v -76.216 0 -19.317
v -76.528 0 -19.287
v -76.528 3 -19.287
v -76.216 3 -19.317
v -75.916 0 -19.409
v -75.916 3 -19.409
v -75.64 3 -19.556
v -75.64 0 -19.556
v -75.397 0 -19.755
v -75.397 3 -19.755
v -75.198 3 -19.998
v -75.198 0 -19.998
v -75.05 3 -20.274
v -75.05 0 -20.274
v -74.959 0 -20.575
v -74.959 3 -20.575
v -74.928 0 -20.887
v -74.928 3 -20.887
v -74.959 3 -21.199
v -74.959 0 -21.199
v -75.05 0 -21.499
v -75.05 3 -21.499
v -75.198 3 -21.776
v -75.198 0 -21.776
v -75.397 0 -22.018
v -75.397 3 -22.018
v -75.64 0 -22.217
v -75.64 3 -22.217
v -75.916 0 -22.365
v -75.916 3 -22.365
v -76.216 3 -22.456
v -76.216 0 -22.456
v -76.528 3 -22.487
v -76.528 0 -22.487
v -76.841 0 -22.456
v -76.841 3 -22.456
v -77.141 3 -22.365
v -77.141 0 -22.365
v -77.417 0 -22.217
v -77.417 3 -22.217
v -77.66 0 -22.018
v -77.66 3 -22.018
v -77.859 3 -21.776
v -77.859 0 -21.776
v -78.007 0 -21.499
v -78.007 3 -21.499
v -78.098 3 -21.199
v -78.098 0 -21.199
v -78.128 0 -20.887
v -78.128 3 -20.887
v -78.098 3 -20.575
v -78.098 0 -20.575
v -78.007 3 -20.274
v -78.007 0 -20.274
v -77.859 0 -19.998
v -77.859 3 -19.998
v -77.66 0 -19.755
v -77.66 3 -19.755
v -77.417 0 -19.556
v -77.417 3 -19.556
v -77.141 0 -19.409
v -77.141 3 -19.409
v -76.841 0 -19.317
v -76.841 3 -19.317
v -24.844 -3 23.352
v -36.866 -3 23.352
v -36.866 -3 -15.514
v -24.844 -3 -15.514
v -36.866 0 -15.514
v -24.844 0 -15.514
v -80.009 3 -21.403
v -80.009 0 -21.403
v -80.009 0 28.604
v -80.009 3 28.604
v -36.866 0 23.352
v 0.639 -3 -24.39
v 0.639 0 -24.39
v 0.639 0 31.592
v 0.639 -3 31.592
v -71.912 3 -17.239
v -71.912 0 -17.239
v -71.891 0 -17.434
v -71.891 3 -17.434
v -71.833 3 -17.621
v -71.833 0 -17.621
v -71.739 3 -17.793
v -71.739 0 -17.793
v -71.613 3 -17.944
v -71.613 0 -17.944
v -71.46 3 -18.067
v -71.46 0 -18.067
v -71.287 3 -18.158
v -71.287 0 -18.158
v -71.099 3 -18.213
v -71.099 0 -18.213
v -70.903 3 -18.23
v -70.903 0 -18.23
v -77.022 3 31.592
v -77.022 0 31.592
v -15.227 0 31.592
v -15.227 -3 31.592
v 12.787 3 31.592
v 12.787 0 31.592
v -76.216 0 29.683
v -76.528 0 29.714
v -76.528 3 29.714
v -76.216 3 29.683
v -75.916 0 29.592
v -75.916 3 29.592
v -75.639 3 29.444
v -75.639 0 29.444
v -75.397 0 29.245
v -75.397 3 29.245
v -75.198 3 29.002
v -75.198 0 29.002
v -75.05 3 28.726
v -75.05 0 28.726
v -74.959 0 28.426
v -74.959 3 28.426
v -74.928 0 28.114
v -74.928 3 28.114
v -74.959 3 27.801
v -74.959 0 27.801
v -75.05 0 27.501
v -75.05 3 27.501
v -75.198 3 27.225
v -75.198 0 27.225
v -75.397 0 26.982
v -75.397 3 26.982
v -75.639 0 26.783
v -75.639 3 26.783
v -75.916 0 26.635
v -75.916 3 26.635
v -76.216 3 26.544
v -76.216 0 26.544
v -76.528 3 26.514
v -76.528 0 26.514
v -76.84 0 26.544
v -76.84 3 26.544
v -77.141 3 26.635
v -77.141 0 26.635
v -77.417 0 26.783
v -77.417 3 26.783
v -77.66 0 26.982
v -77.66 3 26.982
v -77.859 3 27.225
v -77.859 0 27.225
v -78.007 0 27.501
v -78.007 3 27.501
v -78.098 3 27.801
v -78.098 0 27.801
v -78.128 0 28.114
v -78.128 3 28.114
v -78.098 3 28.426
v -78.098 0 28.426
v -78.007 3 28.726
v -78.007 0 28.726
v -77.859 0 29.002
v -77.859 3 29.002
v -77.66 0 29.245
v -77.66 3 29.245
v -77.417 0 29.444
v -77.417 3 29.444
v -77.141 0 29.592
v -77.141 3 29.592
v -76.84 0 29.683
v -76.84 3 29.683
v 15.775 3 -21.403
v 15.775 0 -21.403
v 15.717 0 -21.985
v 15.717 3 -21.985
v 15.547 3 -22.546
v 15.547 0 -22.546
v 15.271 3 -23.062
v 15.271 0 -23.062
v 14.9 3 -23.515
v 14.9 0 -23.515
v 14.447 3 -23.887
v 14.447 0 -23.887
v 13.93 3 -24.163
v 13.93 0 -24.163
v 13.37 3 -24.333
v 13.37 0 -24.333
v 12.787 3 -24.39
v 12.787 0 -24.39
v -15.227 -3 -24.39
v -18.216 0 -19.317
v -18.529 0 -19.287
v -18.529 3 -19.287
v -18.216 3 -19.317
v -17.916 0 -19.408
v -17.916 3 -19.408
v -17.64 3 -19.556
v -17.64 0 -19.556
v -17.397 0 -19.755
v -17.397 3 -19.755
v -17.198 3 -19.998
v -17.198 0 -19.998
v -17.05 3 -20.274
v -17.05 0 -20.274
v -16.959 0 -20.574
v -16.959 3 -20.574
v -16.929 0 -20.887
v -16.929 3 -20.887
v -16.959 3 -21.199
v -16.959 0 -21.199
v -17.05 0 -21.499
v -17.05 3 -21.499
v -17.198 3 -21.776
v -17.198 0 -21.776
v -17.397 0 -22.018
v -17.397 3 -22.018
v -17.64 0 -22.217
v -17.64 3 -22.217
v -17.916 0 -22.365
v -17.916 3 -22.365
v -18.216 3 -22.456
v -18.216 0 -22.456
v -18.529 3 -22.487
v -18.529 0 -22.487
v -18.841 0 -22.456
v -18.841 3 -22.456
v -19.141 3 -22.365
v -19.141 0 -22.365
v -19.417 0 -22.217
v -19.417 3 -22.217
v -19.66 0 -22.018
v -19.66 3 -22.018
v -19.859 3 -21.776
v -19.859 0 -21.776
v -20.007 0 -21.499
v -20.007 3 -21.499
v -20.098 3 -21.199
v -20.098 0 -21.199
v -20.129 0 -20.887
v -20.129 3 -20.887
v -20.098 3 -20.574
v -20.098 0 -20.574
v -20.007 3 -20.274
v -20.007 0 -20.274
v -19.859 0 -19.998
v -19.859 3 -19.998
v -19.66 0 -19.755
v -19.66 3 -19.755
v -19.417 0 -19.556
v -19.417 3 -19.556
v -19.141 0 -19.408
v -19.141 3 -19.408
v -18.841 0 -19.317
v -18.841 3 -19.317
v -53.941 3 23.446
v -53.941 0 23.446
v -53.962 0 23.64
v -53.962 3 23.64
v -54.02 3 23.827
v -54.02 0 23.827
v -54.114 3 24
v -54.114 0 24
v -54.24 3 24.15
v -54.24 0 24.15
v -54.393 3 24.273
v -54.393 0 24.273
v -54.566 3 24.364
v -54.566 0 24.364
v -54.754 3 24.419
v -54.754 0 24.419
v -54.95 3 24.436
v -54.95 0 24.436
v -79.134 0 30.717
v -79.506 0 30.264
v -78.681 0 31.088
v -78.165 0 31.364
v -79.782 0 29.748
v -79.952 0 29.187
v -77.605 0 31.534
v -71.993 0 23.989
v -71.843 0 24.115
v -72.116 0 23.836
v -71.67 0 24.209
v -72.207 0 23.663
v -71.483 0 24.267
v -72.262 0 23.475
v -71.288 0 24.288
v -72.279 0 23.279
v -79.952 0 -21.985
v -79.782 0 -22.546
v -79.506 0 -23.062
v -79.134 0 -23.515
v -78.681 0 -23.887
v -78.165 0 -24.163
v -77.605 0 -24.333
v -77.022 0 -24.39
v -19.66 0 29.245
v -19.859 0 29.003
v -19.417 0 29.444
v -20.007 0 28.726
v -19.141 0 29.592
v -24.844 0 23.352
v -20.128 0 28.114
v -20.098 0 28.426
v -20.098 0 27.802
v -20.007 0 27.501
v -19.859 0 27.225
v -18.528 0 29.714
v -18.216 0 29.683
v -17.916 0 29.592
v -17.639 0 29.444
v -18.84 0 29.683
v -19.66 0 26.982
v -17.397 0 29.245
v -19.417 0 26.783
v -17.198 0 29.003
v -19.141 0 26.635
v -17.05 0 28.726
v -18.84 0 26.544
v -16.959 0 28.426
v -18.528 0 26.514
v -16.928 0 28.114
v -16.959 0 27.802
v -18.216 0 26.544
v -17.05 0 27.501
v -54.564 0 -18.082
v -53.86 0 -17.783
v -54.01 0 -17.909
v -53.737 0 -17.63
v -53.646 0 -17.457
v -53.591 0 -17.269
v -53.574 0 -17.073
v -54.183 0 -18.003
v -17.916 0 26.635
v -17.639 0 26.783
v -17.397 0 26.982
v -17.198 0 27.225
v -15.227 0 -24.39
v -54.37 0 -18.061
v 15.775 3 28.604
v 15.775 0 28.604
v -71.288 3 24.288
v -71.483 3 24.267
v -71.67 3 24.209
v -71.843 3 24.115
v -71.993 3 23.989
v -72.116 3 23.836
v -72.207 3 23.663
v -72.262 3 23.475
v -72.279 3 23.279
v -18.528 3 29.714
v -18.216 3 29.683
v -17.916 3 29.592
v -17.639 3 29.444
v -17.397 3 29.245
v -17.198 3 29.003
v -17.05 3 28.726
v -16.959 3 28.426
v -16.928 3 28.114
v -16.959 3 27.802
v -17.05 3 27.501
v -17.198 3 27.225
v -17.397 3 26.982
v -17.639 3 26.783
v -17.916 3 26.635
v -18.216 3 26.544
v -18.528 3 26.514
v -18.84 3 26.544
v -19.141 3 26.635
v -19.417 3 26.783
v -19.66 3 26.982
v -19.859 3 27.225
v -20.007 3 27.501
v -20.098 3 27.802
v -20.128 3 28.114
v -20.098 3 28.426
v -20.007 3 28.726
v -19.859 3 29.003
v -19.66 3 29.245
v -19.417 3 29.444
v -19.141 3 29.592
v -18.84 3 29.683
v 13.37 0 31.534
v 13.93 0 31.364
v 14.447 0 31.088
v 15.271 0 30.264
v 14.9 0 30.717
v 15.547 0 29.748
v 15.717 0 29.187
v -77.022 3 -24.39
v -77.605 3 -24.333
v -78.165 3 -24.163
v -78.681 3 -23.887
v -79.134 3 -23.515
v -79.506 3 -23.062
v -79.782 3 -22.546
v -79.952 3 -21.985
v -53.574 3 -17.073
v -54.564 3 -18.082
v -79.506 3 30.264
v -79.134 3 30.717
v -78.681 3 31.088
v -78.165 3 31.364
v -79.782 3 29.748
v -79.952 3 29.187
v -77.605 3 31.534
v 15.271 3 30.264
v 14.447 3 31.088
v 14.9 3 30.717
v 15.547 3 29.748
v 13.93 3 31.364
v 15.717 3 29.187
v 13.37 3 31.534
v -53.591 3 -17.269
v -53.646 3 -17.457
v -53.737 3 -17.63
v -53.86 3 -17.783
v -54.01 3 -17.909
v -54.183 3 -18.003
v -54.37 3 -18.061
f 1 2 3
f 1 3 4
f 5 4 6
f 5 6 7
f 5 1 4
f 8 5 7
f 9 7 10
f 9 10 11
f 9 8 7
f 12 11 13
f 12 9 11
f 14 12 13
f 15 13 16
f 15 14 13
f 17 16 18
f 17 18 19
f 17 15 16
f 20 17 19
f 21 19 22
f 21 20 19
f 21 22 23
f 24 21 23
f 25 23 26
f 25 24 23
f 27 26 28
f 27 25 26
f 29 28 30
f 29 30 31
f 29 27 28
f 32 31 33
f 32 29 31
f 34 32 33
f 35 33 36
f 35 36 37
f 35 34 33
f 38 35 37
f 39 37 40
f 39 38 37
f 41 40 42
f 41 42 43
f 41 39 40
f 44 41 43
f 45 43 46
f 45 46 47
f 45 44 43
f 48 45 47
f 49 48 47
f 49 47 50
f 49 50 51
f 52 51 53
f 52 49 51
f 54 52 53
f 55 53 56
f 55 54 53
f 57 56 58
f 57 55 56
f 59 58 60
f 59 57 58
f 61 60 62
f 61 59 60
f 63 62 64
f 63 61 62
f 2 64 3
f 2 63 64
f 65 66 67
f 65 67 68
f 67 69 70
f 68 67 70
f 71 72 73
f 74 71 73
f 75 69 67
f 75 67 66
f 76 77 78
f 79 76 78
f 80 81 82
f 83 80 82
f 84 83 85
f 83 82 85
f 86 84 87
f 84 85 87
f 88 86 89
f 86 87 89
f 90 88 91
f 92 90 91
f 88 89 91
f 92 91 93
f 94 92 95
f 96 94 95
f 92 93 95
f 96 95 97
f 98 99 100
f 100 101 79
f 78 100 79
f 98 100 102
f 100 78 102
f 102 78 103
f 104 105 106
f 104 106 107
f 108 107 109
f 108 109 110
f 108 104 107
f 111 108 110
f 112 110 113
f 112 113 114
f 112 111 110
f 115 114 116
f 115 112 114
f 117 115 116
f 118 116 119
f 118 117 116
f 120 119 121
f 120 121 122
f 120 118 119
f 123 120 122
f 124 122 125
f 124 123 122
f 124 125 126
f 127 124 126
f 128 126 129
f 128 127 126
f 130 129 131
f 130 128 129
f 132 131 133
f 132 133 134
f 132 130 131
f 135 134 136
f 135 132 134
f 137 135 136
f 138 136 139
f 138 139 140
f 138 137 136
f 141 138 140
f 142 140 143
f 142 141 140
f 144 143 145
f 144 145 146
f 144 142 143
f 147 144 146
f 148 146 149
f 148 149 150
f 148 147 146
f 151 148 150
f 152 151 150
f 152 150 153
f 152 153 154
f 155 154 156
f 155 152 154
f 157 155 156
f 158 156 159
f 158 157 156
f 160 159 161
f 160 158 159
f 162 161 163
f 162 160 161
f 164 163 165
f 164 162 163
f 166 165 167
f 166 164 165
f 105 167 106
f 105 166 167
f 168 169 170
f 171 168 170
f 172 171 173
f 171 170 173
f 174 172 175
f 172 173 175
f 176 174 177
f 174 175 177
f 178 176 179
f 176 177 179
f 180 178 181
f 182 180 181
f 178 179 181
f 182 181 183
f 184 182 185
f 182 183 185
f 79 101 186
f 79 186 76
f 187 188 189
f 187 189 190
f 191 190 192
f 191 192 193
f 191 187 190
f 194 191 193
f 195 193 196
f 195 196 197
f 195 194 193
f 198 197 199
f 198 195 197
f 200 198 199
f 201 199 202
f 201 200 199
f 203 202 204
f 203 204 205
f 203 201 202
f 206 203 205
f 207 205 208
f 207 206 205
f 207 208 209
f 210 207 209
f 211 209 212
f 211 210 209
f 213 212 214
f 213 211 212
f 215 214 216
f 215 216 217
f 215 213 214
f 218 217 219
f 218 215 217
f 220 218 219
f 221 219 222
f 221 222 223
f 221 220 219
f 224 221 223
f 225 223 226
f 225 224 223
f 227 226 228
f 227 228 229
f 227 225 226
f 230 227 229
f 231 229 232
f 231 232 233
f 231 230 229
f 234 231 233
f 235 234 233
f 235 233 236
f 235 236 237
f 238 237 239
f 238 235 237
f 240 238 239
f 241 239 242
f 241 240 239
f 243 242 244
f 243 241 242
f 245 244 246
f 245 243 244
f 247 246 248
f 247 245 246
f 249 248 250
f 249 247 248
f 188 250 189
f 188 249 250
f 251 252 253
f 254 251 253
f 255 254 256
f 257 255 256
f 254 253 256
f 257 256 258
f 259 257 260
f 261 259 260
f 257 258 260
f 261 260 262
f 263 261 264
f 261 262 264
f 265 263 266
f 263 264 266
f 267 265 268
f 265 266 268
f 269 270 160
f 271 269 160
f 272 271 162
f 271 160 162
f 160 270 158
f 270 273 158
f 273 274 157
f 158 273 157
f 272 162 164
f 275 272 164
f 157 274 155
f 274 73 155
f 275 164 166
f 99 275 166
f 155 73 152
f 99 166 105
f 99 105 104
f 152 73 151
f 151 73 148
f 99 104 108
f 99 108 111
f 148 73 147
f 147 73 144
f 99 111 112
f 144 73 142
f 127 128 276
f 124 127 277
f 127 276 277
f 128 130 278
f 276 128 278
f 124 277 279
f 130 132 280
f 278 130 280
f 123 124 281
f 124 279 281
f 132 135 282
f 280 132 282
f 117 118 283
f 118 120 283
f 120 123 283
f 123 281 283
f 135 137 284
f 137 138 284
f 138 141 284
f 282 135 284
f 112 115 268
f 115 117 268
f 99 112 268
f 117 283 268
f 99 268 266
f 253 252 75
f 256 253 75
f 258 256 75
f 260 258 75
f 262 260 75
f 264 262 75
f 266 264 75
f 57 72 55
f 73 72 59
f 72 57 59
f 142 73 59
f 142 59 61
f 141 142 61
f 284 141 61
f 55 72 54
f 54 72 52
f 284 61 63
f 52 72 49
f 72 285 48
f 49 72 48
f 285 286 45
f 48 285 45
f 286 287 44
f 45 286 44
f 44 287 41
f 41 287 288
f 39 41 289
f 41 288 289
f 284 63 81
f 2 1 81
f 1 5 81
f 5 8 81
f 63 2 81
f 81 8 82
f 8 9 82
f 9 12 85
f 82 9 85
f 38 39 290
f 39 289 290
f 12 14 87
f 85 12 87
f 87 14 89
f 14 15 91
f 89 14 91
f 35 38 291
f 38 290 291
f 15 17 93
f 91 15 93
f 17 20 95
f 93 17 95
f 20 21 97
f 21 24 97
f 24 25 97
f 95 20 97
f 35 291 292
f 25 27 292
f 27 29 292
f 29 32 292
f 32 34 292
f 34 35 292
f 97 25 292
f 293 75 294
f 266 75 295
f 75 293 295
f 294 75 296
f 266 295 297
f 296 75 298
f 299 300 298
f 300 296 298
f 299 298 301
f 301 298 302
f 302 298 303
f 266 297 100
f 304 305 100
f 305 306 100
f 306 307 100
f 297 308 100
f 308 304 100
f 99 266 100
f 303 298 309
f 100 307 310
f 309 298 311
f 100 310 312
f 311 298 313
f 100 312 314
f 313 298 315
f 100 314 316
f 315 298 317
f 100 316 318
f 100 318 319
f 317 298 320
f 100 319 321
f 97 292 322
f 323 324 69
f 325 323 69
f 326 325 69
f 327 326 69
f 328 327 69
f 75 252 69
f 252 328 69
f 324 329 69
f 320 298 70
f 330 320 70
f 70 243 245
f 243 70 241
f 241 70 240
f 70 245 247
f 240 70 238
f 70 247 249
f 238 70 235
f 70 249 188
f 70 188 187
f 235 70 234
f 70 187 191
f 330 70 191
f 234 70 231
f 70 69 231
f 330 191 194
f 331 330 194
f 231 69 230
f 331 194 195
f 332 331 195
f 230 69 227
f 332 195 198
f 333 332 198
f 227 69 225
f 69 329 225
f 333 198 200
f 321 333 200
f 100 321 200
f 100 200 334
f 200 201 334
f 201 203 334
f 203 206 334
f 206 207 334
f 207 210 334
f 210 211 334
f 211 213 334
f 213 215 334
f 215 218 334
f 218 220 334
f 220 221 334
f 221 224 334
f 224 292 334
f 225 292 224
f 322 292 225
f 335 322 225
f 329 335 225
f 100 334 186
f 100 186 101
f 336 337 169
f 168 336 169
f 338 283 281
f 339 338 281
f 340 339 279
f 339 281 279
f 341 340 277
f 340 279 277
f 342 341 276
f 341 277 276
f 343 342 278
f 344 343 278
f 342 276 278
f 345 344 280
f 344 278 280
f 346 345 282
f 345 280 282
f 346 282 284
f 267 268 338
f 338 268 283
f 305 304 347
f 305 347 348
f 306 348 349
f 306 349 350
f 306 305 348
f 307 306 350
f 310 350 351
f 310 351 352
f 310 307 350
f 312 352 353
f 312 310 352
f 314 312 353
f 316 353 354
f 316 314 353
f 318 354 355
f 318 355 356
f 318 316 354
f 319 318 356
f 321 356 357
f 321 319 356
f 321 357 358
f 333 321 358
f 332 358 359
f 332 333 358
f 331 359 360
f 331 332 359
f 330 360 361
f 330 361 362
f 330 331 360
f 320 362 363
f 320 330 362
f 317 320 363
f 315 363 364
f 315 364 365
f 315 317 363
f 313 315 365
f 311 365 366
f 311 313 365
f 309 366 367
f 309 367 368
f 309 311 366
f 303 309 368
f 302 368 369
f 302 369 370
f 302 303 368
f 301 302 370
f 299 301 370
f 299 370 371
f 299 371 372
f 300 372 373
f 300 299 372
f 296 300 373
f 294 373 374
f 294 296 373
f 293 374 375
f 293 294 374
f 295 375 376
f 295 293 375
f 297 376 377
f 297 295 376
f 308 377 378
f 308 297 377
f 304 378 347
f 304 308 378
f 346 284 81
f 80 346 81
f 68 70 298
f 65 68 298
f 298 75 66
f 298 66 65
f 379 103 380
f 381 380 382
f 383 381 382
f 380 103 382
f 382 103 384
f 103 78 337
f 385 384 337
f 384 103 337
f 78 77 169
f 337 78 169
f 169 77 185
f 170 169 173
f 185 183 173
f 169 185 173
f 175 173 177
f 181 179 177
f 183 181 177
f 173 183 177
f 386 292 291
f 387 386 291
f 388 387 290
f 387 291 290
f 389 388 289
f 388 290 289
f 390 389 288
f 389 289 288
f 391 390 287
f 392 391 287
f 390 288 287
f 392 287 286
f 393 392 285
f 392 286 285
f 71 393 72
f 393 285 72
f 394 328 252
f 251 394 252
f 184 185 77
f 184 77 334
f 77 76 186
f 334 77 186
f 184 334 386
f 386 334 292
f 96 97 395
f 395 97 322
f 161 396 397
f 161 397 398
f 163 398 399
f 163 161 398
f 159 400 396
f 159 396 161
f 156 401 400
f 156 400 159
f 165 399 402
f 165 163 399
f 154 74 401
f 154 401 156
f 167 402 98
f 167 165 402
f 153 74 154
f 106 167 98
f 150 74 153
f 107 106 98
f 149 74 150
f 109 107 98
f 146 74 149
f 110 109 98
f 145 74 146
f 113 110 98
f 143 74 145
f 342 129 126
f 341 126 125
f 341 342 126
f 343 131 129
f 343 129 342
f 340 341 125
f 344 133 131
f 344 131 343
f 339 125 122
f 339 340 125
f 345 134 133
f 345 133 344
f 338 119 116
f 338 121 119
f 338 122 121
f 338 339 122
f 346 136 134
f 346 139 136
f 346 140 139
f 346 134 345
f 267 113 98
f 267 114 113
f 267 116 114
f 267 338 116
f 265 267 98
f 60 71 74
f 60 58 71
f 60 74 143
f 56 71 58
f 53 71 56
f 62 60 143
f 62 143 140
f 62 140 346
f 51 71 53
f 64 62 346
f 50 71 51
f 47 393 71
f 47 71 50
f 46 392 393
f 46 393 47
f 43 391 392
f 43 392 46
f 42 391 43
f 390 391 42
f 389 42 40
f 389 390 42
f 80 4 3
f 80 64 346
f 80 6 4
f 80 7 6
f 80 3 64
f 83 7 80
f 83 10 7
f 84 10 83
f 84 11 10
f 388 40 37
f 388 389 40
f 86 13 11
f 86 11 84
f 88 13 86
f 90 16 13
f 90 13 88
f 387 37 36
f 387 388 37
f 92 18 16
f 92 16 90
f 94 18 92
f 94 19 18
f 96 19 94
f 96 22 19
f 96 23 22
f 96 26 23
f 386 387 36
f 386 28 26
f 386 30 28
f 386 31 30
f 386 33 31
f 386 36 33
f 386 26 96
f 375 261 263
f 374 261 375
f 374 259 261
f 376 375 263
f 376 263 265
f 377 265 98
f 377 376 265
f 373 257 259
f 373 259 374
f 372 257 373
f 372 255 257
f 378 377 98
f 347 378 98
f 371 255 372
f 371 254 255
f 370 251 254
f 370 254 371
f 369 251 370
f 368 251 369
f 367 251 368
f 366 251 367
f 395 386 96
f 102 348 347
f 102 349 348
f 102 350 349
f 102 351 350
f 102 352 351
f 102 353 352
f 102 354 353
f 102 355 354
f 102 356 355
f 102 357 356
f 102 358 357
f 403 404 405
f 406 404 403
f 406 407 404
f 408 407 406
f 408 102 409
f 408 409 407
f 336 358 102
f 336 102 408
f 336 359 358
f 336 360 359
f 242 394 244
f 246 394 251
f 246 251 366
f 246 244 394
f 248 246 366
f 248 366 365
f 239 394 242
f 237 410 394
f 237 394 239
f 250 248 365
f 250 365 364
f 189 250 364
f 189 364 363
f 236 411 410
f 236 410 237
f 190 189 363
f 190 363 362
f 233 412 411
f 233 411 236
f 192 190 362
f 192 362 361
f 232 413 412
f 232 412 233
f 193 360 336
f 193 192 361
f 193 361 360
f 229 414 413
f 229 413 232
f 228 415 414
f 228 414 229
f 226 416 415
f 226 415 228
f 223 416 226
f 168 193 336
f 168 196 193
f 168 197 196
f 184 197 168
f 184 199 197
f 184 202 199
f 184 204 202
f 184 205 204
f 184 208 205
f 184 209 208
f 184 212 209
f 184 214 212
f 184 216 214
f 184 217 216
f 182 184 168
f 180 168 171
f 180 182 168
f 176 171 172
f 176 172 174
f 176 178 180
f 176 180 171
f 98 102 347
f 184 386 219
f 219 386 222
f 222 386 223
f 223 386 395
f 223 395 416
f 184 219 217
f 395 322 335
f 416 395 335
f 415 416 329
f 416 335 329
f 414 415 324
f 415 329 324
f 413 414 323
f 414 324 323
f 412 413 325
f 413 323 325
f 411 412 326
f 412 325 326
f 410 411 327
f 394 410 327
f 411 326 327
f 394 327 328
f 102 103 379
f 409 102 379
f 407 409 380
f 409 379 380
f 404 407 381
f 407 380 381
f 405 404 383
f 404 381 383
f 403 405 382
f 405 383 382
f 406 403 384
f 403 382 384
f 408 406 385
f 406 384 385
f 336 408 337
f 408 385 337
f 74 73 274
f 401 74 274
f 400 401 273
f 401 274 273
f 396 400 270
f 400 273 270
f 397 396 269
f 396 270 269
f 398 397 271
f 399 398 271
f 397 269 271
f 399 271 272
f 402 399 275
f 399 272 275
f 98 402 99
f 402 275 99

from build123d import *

# Parameters (mm, degrees)
SKETCH_1_R      = 1.6
EXTRUDE_1_DEPTH = 3
SKETCH_3_W      = 15.866394843
SKETCH_3_H      = 55.981711963
SKETCH_3_W_2    = 12.02170443
SKETCH_3_H_2    = 38.866282165
EXTRUDE_3_DEPTH = 3


with BuildPart() as part:
    # 草图1 → 凸台-拉伸1 (new body)
    with BuildSketch(Plane(origin=(0, 0, 0), x_dir=(1, 0, 0), z_dir=(0, 1, 0))):
        with BuildLine():
            Line((-80.009028181, 21.402670377), (-80.009028181, -28.604431477))
            ThreePointArc((-80.009028181, -28.604431477), (-79.134066788, -30.716775138), (-77.021723127, -31.591736531))
            Line((-77.021723127, -31.591736531), (12.787258331, -31.591736531))
            ThreePointArc((12.787258331, -31.591736531), (14.899601993, -30.716775138), (15.774563386, -28.604431477))
            Line((15.774563386, -28.604431477), (15.774563386, 21.402670377))
            ThreePointArc((15.774563386, 21.402670377), (14.899601993, 23.515014039), (12.787258331, 24.389975432))
            Line((12.787258331, 24.389975432), (-77.021723127, 24.389975432))
            ThreePointArc((-77.021723127, 24.389975432), (-79.134066788, 23.515014039), (-80.009028181, 21.402670377))
        make_face()
        with Locations(Location((-76.52848462, 20.886724226, 0), (0, 0, 270))):
            Circle(SKETCH_1_R, mode=Mode.SUBTRACT)
        with Locations(Location((-18.52858622, 20.886597225, 0), (0, 0, 270))):
            Circle(SKETCH_1_R, mode=Mode.SUBTRACT)
        with Locations(Location((-18.52833222, -28.113656775, 0), (0, 0, 270))):
            Circle(SKETCH_1_R, mode=Mode.SUBTRACT)
        with Locations(Location((-76.52833222, -28.113529775, 0), (0, 0, 270))):
            Circle(SKETCH_1_R, mode=Mode.SUBTRACT)
        with BuildLine():
            Line((-70.903401709, 18.230282987), (-54.564490165, 18.082300473))
            ThreePointArc((-54.564490165, 18.082300473), (-53.860065027, 17.78301522), (-53.573587867, 17.073284796))
            Line((-53.573587867, 17.073284796), (-53.940568984, -23.445502526))
            ThreePointArc((-53.940568984, -23.445502526), (-54.239854236, -24.149927664), (-54.94958466, -24.436404824))
            Line((-54.94958466, -24.436404824), (-71.288496204, -24.288422311))
            ThreePointArc((-71.288496204, -24.288422311), (-71.992921342, -23.989137058), (-72.279398502, -23.279406634))
            Line((-72.279398502, -23.279406634), (-71.912417386, 17.239380688))
            ThreePointArc((-71.912417386, 17.239380688), (-71.613132133, 17.943805826), (-70.903401709, 18.230282987))
        make_face(mode=Mode.SUBTRACT)
    extrude(amount=EXTRUDE_1_DEPTH)

    # 草图3 → 凸台-拉伸3 (add)
    with BuildSketch(Plane.XZ):
        with Locations((-7.293882236, 3.60088055)):
            Rectangle(SKETCH_3_W, SKETCH_3_H)
        with Locations((-30.854956036, 3.919082923)):
            Rectangle(SKETCH_3_W_2, SKETCH_3_H_2)
    extrude(amount=EXTRUDE_3_DEPTH)


solid = part.part
